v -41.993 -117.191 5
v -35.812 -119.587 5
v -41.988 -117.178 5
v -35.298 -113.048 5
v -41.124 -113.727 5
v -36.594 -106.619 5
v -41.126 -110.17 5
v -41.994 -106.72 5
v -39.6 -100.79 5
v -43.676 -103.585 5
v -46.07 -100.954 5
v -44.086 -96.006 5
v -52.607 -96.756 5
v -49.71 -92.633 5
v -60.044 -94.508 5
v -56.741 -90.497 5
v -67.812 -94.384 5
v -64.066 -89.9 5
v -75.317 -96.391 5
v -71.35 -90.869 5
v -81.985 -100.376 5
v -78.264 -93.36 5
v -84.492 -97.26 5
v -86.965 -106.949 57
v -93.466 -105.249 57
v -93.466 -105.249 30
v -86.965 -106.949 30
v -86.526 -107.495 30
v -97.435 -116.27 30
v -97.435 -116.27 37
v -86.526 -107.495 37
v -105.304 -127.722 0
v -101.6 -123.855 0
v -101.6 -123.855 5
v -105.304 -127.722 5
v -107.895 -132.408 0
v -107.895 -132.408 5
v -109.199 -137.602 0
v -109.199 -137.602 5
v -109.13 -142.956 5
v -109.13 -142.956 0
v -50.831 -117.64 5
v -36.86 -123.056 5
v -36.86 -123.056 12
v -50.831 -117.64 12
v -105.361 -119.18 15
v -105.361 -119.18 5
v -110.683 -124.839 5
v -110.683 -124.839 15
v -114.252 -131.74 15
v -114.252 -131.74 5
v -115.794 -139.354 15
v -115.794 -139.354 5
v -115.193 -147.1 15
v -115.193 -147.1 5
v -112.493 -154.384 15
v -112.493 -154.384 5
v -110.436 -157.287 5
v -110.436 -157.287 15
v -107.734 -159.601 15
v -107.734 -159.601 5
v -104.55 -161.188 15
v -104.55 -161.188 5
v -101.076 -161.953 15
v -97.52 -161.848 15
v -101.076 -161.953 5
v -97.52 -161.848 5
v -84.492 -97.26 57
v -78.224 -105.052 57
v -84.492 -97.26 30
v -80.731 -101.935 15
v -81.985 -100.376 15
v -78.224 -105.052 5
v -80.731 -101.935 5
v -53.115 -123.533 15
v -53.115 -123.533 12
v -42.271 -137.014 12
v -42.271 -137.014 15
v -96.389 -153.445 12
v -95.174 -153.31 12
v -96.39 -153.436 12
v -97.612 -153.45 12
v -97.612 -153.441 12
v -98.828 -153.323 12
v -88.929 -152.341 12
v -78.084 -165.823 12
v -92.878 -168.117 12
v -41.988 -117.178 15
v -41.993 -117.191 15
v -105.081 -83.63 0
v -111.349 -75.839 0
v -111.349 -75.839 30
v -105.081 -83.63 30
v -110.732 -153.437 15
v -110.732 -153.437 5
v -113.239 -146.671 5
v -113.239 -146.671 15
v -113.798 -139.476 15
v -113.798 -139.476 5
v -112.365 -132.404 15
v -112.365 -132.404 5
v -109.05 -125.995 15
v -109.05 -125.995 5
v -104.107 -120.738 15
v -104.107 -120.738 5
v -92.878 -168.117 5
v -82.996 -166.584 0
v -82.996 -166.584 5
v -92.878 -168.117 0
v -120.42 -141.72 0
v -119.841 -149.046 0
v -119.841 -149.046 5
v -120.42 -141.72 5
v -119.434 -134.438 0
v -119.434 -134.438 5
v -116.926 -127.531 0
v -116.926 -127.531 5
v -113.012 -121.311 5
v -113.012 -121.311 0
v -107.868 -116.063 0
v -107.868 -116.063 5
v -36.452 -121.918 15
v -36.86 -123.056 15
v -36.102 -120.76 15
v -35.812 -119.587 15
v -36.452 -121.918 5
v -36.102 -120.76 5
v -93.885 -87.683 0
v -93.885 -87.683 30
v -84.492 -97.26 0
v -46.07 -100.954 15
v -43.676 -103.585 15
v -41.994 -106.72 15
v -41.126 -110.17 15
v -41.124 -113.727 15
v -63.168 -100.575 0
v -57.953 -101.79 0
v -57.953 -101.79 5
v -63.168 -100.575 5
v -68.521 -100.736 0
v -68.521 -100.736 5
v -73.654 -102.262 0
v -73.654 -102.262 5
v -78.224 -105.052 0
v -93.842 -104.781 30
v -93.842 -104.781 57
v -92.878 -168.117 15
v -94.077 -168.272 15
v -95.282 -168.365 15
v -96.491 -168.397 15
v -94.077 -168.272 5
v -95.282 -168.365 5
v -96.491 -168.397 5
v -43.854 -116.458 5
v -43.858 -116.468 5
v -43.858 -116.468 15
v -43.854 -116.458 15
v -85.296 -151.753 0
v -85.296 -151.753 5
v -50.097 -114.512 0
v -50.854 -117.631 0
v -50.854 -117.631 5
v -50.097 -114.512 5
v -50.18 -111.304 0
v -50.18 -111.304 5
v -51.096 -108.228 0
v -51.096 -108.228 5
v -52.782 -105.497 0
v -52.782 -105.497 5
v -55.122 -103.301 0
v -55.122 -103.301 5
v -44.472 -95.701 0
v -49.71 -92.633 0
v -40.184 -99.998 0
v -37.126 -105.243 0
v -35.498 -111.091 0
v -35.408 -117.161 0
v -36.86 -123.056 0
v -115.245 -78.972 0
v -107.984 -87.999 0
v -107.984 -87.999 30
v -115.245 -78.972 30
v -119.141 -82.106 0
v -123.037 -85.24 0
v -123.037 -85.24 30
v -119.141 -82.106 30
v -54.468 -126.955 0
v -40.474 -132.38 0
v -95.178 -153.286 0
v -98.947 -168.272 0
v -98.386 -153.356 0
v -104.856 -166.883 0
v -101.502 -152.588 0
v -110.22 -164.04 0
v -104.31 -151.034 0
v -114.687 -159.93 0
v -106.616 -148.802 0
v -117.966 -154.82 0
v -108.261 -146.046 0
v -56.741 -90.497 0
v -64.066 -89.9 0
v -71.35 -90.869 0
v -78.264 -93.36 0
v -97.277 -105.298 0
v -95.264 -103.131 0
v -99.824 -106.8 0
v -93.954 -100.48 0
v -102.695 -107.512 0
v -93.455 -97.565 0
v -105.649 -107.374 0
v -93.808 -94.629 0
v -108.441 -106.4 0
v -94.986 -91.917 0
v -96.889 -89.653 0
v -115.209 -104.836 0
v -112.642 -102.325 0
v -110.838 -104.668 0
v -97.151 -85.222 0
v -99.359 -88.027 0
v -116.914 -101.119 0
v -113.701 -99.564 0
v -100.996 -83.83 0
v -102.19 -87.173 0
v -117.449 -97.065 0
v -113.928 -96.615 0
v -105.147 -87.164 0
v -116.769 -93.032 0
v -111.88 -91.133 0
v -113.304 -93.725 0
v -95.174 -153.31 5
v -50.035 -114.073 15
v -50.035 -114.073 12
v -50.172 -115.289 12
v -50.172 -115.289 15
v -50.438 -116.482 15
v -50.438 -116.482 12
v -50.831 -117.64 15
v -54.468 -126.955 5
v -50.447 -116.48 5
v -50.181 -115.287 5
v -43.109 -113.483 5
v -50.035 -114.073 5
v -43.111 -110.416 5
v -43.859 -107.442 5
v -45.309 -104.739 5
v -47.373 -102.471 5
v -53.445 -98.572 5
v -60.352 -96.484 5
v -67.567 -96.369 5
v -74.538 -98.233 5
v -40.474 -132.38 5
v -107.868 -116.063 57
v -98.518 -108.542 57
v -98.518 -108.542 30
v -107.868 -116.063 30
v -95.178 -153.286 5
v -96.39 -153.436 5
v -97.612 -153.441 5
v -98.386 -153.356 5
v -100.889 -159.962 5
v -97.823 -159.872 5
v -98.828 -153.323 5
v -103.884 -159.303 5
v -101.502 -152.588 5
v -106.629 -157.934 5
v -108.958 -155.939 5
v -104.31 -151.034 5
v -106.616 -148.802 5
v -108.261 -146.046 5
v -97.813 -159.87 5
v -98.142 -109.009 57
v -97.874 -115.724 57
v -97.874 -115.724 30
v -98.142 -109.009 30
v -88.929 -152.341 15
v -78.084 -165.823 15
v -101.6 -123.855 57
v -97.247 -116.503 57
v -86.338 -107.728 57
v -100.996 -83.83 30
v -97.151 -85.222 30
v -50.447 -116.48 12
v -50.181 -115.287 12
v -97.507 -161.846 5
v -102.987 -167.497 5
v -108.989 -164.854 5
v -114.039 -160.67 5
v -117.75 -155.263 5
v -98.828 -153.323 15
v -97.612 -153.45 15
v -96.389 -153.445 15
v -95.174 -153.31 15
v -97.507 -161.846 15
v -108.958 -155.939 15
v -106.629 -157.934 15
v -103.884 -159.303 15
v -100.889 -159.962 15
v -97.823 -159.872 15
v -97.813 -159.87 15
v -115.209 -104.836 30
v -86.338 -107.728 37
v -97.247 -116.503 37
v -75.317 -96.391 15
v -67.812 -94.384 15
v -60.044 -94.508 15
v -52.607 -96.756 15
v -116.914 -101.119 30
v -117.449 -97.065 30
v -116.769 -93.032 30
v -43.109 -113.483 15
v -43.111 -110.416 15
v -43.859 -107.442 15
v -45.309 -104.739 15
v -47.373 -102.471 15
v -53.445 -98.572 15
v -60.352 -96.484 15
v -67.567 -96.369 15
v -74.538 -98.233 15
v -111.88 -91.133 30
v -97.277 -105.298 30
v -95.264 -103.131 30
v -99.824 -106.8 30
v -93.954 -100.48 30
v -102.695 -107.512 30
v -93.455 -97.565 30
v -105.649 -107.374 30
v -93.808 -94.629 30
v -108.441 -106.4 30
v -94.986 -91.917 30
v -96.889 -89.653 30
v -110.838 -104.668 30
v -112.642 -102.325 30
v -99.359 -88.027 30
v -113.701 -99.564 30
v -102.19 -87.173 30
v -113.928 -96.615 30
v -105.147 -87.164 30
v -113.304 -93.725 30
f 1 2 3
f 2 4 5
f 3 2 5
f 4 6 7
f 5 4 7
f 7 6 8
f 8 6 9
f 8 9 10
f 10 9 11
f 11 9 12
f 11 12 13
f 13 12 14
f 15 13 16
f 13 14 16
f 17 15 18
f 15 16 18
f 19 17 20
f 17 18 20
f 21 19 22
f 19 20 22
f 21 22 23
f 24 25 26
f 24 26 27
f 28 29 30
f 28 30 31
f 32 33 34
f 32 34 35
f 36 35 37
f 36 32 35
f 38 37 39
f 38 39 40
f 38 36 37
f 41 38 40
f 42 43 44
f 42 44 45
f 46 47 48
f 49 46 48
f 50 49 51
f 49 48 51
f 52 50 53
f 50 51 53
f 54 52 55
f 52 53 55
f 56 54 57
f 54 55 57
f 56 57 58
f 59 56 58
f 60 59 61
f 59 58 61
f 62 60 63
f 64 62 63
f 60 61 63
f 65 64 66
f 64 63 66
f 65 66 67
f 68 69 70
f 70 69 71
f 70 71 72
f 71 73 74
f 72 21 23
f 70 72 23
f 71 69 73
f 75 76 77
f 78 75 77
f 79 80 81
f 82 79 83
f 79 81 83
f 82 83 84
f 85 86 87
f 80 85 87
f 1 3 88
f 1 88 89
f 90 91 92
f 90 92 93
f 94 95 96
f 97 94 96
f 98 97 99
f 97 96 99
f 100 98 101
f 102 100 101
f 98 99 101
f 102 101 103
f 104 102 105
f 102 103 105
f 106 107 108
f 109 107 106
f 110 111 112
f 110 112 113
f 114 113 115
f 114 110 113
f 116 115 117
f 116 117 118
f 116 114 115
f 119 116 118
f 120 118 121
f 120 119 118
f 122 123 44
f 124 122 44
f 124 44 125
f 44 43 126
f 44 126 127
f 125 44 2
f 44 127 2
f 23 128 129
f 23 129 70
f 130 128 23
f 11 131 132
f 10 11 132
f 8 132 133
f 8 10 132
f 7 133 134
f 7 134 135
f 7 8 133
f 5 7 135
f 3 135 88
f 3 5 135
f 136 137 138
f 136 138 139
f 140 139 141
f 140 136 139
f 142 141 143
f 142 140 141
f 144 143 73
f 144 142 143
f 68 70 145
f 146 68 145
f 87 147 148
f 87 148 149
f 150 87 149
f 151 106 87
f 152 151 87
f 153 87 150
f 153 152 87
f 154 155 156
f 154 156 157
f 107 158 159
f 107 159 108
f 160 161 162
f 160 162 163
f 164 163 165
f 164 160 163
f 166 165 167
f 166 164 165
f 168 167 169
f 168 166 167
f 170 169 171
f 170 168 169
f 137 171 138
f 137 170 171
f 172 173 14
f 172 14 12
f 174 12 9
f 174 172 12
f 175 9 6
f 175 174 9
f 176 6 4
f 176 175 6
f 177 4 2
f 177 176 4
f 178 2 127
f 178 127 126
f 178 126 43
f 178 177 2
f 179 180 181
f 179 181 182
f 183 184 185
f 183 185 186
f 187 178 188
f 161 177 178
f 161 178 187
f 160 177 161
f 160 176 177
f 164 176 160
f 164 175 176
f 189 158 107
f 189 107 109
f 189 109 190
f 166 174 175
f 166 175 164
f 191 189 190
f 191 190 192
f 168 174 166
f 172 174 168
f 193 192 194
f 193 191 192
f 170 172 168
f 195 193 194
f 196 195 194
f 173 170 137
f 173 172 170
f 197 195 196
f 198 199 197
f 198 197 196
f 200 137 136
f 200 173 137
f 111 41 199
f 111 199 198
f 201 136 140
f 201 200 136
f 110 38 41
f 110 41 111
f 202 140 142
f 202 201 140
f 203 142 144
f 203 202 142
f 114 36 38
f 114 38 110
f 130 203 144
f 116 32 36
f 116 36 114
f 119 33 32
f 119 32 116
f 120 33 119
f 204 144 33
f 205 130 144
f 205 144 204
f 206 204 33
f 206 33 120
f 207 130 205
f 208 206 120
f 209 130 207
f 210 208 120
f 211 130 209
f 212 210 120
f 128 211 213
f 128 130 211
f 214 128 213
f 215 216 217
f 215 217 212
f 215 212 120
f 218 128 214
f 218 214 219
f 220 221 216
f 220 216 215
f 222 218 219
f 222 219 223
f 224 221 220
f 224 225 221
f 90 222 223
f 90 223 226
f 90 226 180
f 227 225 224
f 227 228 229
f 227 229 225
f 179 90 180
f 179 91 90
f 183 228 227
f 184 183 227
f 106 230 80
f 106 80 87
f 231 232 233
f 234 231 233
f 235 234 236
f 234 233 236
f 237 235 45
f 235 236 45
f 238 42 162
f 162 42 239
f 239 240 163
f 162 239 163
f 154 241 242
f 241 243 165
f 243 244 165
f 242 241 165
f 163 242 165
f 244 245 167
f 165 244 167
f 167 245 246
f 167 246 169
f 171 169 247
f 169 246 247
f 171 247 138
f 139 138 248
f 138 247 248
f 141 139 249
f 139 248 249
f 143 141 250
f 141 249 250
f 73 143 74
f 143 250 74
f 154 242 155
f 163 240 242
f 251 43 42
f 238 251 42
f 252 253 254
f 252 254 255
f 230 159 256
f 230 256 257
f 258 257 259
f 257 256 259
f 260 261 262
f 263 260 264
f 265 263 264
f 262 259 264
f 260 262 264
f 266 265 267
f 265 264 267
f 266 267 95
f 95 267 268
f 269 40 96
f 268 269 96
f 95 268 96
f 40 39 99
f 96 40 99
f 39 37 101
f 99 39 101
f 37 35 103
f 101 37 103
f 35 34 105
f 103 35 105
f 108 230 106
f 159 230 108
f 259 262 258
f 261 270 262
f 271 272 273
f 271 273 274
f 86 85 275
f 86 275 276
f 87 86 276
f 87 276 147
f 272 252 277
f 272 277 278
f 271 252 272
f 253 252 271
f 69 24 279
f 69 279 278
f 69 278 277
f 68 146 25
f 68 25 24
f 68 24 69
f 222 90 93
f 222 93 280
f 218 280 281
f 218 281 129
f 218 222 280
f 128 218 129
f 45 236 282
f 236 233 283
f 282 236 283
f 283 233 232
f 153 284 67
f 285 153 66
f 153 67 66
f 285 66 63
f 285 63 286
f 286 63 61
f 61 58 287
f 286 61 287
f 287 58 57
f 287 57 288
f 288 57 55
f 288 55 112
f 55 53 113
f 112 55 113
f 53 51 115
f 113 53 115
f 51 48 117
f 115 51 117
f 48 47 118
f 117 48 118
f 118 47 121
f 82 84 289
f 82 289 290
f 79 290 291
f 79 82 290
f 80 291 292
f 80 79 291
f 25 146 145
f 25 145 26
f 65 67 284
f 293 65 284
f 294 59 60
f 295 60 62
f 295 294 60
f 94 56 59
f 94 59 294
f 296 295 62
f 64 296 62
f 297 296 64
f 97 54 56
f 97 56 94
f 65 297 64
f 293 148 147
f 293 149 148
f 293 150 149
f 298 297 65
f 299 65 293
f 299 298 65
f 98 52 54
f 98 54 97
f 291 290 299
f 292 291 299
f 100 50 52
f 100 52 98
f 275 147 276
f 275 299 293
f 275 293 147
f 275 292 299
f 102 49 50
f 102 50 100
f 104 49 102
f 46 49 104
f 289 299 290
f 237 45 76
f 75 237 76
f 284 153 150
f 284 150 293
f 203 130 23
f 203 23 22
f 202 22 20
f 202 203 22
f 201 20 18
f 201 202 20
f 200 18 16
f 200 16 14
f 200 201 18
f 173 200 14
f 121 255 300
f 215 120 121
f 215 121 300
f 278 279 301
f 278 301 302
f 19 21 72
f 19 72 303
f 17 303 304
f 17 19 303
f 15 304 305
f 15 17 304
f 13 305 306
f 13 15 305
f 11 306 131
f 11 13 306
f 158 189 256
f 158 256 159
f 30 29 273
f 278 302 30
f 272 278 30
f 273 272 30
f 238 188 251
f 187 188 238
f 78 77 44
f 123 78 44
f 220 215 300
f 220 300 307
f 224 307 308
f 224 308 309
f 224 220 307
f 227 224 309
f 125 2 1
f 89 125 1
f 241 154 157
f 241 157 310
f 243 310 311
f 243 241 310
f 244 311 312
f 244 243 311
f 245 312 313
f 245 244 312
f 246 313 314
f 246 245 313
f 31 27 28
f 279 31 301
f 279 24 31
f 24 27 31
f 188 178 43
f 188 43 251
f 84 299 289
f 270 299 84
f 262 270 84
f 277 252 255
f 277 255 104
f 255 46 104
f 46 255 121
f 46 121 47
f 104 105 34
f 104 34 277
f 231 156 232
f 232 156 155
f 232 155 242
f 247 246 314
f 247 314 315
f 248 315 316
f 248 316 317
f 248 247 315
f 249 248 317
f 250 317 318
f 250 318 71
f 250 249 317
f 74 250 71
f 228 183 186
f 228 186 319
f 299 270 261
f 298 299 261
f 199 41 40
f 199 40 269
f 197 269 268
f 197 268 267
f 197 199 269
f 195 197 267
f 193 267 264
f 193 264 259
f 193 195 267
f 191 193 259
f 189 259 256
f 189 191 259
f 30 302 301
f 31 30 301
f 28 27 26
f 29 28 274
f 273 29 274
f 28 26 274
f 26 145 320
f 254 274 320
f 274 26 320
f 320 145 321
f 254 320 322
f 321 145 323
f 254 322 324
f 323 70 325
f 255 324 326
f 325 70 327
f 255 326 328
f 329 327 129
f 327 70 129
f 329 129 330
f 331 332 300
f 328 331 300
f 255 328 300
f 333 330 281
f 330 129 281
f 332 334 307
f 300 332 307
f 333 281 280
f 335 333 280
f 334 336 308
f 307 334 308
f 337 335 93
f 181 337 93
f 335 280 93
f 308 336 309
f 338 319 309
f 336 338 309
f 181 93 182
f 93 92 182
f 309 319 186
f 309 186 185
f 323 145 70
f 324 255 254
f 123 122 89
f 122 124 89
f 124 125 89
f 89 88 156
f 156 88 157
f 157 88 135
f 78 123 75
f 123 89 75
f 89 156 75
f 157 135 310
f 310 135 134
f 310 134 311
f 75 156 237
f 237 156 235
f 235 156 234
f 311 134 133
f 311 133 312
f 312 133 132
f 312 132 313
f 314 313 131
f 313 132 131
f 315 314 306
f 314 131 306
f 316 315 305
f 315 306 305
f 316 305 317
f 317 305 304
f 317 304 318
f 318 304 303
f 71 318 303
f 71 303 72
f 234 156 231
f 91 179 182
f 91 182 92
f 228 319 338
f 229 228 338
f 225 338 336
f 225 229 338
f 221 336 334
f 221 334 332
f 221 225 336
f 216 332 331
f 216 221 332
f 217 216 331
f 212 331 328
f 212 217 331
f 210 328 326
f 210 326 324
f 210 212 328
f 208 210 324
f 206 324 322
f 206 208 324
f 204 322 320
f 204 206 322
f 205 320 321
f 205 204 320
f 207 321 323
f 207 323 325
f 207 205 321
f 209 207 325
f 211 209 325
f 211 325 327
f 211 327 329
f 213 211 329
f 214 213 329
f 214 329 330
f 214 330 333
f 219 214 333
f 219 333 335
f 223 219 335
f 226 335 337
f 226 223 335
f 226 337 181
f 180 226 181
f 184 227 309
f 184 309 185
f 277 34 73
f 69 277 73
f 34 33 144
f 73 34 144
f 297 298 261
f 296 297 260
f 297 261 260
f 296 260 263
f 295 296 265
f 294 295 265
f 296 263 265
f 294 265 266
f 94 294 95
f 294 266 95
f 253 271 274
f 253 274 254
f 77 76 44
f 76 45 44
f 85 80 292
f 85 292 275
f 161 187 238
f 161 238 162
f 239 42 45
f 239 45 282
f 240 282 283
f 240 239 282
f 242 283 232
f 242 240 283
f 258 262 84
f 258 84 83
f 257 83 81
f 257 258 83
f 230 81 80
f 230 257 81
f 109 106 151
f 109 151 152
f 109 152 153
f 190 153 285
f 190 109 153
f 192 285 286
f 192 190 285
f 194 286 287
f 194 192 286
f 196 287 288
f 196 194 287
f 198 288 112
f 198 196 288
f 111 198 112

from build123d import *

# Parameters (mm, degrees)
ESTRUSIONE_ESTRUSIONE1_DEPTH = 5
ESTRUSIONE_ESTRUSIONE2_DEPTH = 7
ESTRUSIONE_ESTRUSIONE3_DEPTH = 3
ESTRUSIONE_ESTRUSIONE4_DEPTH = 52
TAGLIO_ESTRUSIONE2_DEPTH     = 27
ESTRUSIONE_ESTRUSIONE8_DEPTH = 10
ESTRUSIONE_ESTRUSIONE6_DEPTH = 30
SCHIZZO10_W                  = 14
SCHIZZO10_H                  = 7
ESTRUSIONE_ESTRUSIONE7_DEPTH = 0.3


with BuildPart() as part:
    # Schizzo1 → Estrusione-Estrusione1 (new body)
    with BuildSketch(Plane.XY):
        with BuildLine():
            Line((-82.995904107, -166.584374689), (-92.877799089, -168.116742646))
            ThreePointArc((-92.877799089, -168.116742646), (-110.220012955, -164.040092202), (-119.840608042, -149.046239769))
            ThreePointArc((-119.840608042, -149.046239769), (-118.364815633, -130.917411526), (-107.867932944, -116.063192243))
            Line((-107.867932944, -116.063192243), (-84.49215827, -97.259651129))
            ThreePointArc((-84.49215827, -97.259651129), (-67.733683115, -90.189581316), (-49.709718148, -92.632748029))
            ThreePointArc((-49.709718148, -92.632748029), (-37.125664022, -105.242785395), (-36.859828578, -123.055724291))
            Line((-36.859828578, -123.055724291), (-40.474113425, -132.379722631))
            Line((-40.474113425, -132.379722631), (-54.467826156, -126.955304689))
            Line((-54.467826156, -126.955304689), (-50.853541308, -117.631306349))
            ThreePointArc((-50.853541308, -117.631306349), (-51.095893898, -108.22813541), (-57.953355129, -101.789689638))
            ThreePointArc((-57.953355129, -101.789689638), (-68.520842721, -100.735914417), (-78.224311232, -105.051576021))
            Line((-78.224311232, -105.051576021), (-101.600085906, -123.855117134))
            ThreePointArc((-101.600085906, -123.855117134), (-107.894780127, -132.408424149), (-109.129903142, -142.956253658))
            ThreePointArc((-109.129903142, -142.956253658), (-104.310440062, -151.034071069), (-95.177618995, -153.285723315))
            Line((-95.177618995, -153.285723315), (-85.295724012, -151.753355358))
            Line((-85.295724012, -151.753355358), (-82.995904107, -166.584374689))
        make_face()
    extrude(amount=ESTRUSIONE_ESTRUSIONE1_DEPTH)

    # Schizzo2 → Estrusione-Estrusione2 (add)
    with BuildSketch(Plane.XY.offset(5)):
        with BuildLine():
            Line((-36.859828578, -123.055724291), (-50.830842779, -117.640105037))
            ThreePointArc((-50.830842779, -117.640105037), (-50.298673229, -115.886666013), (-50.034997321, -114.073318872))
            Line((-50.034997321, -114.073318872), (-35.811832194, -119.586680021))
            ThreePointArc((-35.811832194, -119.586680021), (-36.269524014, -121.341233275), (-36.859828578, -123.055724291))
        make_face()
        with BuildLine():
            Line((-96.490830562, -168.397042736), (-98.828360202, -153.322841843))
            ThreePointArc((-98.828360202, -153.322841843), (-97.000632762, -153.453858051), (-95.173888567, -153.309779998))
            Line((-95.173888567, -153.309779998), (-92.877799089, -168.116742646))
            ThreePointArc((-92.877799089, -168.116742646), (-94.678957246, -168.325951195), (-96.490830562, -168.397042736))
        make_face()
    extrude(amount=ESTRUSIONE_ESTRUSIONE2_DEPTH)

    # Schizzo3 → Estrusione-Estrusione3 (add)
    with BuildSketch(Plane.XY.offset(12)):
        with BuildLine():
            Line((-42.270578454, -137.014176653), (-36.859828578, -123.055724291))
            ThreePointArc((-36.859828578, -123.055724291), (-36.269524014, -121.341233275), (-35.811832194, -119.586680021))
            Line((-35.811832194, -119.586680021), (-50.034997321, -114.073318872))
            ThreePointArc((-50.034997321, -114.073318872), (-50.288758238, -115.888878313), (-50.830842779, -117.640105037))
            Line((-50.830842779, -117.640105037), (-53.115040991, -123.532795079))
            Line((-53.115040991, -123.532795079), (-42.270578454, -137.014176653))
        make_face()
        with BuildLine():
            Line((-96.490830562, -168.397042736), (-98.828360202, -153.322841843))
            ThreePointArc((-98.828360202, -153.322841843), (-97.000596453, -153.464016791), (-95.173888567, -153.309779998))
            Line((-95.173888567, -153.309779998), (-88.928612449, -152.34133609))
            Line((-88.928612449, -152.34133609), (-78.084149913, -165.822717664))
            Line((-78.084149913, -165.822717664), (-92.877799089, -168.116742646))
            ThreePointArc((-92.877799089, -168.116742646), (-94.678957246, -168.325951195), (-96.490830562, -168.397042736))
        make_face()
    extrude(amount=ESTRUSIONE_ESTRUSIONE3_DEPTH)

    # Schizzo4 → Estrusione-Estrusione4 (add)
    with BuildSketch(Plane.XY.offset(5)):
        Polygon((-101.600085906, -123.855117134), (-78.224311232, -105.051576021), (-84.49215827, -97.259651129), (-107.867932944, -116.063192243), align=None)
    extrude(amount=ESTRUSIONE_ESTRUSIONE4_DEPTH)

    # Schizzo5 → Taglio-Estrusione2 (cut)
    with BuildSketch(Plane.XY.offset(57)):
        Polygon((-97.246900104, -116.503262037), (-97.873684808, -115.724069548), (-98.141552252, -109.009291291), (-98.517623074, -108.541775798), (-93.842468139, -104.781067575), (-93.466397317, -105.248583068), (-86.96498996, -106.949083694), (-86.338205256, -107.728276184), align=None)
    extrude(amount=-TAGLIO_ESTRUSIONE2_DEPTH, mode=Mode.SUBTRACT)

    # Schizzo6 → Estrusione-Estrusione8 (add)
    with BuildSketch(Plane.XY.offset(5)):
        Polygon((-97.823256998, -159.87152255), (-97.519846298, -161.848374074), (-97.50663255, -161.846365055), (-97.813109395, -159.869965078), align=None)
        with BuildLine():
            Line((-104.107224721, -120.738347178), (-105.360794128, -119.1799622))
            ThreePointArc((-105.360794128, -119.1799622), (-115.28727508, -135.493487076), (-112.492970749, -154.384172115))
            ThreePointArc((-112.492970749, -154.384172115), (-106.191101066, -160.49275607), (-97.519846298, -161.848374074))
            Line((-97.519846298, -161.848374074), (-97.823256998, -159.87152255))
            ThreePointArc((-97.823256998, -159.87152255), (-105.298812913, -158.702833766), (-110.731703589, -153.436576214))
            ThreePointArc((-110.731703589, -153.436576214), (-113.327097811, -135.89060806), (-104.107224721, -120.738347178))
        make_face()
        with BuildLine():
            ThreePointArc((-43.853805634, -116.458338954), (-43.393471858, -108.905997429), (-47.373234104, -102.470839142))
            ThreePointArc((-47.373234104, -102.470839142), (-63.955496248, -96.175948212), (-80.731450047, -101.934806064))
            Line((-80.731450047, -101.934806064), (-81.985019455, -100.376421086))
            ThreePointArc((-81.985019455, -100.376421086), (-63.923362402, -94.176206375), (-46.070241465, -100.953535552))
            ThreePointArc((-46.070241465, -100.953535552), (-41.453924934, -108.417983362), (-41.987888093, -117.178305432))
            Line((-41.987888093, -117.178305432), (-43.853805634, -116.458338954))
        make_face()
        Polygon((-43.857501376, -116.467917109), (-43.853805634, -116.458338954), (-41.987888093, -117.178305432), (-41.99269947, -117.190774947), align=None)
    extrude(amount=ESTRUSIONE_ESTRUSIONE8_DEPTH)

    # Schizzo9 → Estrusione-Estrusione6 (add)
    with BuildSketch(Plane(origin=(0, 0, 0), x_dir=(-1, 0, 0), z_dir=(0, 0, -1))):
        with BuildLine():
            Line((93.885019226, -87.68303048), (84.49215827, -97.259651129))
            Line((84.49215827, -97.259651129), (107.867932944, -116.063192243))
            Line((107.867932944, -116.063192243), (115.209386763, -104.836413728))
            ThreePointArc((115.209386763, -104.836413728), (117.333034353, -99.111871829), (116.768742523, -93.032247353))
            Line((116.768742523, -93.032247353), (123.036589561, -85.240322461))
            Line((123.036589561, -85.240322461), (119.140627115, -82.106398942))
            Line((119.140627115, -82.106398942), (111.879963827, -91.132551409))
            ThreePointArc((111.879963827, -91.132551409), (97.276918838, -105.29783483), (107.984001382, -87.99862789))
            Line((107.984001382, -87.99862789), (115.24466467, -78.972475424))
            Line((115.24466467, -78.972475424), (111.348702224, -75.838551905))
            Line((111.348702224, -75.838551905), (105.080855186, -83.630476796))
            ThreePointArc((105.080855186, -83.630476796), (99.021531527, -84.382045715), (93.885019226, -87.68303048))
        make_face()
    extrude(amount=-ESTRUSIONE_ESTRUSIONE6_DEPTH)

    # Schizzo10 → Estrusione-Estrusione7 (add)
    with BuildSketch(Plane(origin=(18.694228144, -23.239881369, 0), x_dir=(0.779192489117125, 0.6267847037886766, 0), z_dir=(-0.6267847037886766, 0.779192489117125, 0))):
        with Locations((-141.796516737, -33.5)):
            Rectangle(SCHIZZO10_W, SCHIZZO10_H)
    extrude(amount=ESTRUSIONE_ESTRUSIONE7_DEPTH)


solid = part.part
